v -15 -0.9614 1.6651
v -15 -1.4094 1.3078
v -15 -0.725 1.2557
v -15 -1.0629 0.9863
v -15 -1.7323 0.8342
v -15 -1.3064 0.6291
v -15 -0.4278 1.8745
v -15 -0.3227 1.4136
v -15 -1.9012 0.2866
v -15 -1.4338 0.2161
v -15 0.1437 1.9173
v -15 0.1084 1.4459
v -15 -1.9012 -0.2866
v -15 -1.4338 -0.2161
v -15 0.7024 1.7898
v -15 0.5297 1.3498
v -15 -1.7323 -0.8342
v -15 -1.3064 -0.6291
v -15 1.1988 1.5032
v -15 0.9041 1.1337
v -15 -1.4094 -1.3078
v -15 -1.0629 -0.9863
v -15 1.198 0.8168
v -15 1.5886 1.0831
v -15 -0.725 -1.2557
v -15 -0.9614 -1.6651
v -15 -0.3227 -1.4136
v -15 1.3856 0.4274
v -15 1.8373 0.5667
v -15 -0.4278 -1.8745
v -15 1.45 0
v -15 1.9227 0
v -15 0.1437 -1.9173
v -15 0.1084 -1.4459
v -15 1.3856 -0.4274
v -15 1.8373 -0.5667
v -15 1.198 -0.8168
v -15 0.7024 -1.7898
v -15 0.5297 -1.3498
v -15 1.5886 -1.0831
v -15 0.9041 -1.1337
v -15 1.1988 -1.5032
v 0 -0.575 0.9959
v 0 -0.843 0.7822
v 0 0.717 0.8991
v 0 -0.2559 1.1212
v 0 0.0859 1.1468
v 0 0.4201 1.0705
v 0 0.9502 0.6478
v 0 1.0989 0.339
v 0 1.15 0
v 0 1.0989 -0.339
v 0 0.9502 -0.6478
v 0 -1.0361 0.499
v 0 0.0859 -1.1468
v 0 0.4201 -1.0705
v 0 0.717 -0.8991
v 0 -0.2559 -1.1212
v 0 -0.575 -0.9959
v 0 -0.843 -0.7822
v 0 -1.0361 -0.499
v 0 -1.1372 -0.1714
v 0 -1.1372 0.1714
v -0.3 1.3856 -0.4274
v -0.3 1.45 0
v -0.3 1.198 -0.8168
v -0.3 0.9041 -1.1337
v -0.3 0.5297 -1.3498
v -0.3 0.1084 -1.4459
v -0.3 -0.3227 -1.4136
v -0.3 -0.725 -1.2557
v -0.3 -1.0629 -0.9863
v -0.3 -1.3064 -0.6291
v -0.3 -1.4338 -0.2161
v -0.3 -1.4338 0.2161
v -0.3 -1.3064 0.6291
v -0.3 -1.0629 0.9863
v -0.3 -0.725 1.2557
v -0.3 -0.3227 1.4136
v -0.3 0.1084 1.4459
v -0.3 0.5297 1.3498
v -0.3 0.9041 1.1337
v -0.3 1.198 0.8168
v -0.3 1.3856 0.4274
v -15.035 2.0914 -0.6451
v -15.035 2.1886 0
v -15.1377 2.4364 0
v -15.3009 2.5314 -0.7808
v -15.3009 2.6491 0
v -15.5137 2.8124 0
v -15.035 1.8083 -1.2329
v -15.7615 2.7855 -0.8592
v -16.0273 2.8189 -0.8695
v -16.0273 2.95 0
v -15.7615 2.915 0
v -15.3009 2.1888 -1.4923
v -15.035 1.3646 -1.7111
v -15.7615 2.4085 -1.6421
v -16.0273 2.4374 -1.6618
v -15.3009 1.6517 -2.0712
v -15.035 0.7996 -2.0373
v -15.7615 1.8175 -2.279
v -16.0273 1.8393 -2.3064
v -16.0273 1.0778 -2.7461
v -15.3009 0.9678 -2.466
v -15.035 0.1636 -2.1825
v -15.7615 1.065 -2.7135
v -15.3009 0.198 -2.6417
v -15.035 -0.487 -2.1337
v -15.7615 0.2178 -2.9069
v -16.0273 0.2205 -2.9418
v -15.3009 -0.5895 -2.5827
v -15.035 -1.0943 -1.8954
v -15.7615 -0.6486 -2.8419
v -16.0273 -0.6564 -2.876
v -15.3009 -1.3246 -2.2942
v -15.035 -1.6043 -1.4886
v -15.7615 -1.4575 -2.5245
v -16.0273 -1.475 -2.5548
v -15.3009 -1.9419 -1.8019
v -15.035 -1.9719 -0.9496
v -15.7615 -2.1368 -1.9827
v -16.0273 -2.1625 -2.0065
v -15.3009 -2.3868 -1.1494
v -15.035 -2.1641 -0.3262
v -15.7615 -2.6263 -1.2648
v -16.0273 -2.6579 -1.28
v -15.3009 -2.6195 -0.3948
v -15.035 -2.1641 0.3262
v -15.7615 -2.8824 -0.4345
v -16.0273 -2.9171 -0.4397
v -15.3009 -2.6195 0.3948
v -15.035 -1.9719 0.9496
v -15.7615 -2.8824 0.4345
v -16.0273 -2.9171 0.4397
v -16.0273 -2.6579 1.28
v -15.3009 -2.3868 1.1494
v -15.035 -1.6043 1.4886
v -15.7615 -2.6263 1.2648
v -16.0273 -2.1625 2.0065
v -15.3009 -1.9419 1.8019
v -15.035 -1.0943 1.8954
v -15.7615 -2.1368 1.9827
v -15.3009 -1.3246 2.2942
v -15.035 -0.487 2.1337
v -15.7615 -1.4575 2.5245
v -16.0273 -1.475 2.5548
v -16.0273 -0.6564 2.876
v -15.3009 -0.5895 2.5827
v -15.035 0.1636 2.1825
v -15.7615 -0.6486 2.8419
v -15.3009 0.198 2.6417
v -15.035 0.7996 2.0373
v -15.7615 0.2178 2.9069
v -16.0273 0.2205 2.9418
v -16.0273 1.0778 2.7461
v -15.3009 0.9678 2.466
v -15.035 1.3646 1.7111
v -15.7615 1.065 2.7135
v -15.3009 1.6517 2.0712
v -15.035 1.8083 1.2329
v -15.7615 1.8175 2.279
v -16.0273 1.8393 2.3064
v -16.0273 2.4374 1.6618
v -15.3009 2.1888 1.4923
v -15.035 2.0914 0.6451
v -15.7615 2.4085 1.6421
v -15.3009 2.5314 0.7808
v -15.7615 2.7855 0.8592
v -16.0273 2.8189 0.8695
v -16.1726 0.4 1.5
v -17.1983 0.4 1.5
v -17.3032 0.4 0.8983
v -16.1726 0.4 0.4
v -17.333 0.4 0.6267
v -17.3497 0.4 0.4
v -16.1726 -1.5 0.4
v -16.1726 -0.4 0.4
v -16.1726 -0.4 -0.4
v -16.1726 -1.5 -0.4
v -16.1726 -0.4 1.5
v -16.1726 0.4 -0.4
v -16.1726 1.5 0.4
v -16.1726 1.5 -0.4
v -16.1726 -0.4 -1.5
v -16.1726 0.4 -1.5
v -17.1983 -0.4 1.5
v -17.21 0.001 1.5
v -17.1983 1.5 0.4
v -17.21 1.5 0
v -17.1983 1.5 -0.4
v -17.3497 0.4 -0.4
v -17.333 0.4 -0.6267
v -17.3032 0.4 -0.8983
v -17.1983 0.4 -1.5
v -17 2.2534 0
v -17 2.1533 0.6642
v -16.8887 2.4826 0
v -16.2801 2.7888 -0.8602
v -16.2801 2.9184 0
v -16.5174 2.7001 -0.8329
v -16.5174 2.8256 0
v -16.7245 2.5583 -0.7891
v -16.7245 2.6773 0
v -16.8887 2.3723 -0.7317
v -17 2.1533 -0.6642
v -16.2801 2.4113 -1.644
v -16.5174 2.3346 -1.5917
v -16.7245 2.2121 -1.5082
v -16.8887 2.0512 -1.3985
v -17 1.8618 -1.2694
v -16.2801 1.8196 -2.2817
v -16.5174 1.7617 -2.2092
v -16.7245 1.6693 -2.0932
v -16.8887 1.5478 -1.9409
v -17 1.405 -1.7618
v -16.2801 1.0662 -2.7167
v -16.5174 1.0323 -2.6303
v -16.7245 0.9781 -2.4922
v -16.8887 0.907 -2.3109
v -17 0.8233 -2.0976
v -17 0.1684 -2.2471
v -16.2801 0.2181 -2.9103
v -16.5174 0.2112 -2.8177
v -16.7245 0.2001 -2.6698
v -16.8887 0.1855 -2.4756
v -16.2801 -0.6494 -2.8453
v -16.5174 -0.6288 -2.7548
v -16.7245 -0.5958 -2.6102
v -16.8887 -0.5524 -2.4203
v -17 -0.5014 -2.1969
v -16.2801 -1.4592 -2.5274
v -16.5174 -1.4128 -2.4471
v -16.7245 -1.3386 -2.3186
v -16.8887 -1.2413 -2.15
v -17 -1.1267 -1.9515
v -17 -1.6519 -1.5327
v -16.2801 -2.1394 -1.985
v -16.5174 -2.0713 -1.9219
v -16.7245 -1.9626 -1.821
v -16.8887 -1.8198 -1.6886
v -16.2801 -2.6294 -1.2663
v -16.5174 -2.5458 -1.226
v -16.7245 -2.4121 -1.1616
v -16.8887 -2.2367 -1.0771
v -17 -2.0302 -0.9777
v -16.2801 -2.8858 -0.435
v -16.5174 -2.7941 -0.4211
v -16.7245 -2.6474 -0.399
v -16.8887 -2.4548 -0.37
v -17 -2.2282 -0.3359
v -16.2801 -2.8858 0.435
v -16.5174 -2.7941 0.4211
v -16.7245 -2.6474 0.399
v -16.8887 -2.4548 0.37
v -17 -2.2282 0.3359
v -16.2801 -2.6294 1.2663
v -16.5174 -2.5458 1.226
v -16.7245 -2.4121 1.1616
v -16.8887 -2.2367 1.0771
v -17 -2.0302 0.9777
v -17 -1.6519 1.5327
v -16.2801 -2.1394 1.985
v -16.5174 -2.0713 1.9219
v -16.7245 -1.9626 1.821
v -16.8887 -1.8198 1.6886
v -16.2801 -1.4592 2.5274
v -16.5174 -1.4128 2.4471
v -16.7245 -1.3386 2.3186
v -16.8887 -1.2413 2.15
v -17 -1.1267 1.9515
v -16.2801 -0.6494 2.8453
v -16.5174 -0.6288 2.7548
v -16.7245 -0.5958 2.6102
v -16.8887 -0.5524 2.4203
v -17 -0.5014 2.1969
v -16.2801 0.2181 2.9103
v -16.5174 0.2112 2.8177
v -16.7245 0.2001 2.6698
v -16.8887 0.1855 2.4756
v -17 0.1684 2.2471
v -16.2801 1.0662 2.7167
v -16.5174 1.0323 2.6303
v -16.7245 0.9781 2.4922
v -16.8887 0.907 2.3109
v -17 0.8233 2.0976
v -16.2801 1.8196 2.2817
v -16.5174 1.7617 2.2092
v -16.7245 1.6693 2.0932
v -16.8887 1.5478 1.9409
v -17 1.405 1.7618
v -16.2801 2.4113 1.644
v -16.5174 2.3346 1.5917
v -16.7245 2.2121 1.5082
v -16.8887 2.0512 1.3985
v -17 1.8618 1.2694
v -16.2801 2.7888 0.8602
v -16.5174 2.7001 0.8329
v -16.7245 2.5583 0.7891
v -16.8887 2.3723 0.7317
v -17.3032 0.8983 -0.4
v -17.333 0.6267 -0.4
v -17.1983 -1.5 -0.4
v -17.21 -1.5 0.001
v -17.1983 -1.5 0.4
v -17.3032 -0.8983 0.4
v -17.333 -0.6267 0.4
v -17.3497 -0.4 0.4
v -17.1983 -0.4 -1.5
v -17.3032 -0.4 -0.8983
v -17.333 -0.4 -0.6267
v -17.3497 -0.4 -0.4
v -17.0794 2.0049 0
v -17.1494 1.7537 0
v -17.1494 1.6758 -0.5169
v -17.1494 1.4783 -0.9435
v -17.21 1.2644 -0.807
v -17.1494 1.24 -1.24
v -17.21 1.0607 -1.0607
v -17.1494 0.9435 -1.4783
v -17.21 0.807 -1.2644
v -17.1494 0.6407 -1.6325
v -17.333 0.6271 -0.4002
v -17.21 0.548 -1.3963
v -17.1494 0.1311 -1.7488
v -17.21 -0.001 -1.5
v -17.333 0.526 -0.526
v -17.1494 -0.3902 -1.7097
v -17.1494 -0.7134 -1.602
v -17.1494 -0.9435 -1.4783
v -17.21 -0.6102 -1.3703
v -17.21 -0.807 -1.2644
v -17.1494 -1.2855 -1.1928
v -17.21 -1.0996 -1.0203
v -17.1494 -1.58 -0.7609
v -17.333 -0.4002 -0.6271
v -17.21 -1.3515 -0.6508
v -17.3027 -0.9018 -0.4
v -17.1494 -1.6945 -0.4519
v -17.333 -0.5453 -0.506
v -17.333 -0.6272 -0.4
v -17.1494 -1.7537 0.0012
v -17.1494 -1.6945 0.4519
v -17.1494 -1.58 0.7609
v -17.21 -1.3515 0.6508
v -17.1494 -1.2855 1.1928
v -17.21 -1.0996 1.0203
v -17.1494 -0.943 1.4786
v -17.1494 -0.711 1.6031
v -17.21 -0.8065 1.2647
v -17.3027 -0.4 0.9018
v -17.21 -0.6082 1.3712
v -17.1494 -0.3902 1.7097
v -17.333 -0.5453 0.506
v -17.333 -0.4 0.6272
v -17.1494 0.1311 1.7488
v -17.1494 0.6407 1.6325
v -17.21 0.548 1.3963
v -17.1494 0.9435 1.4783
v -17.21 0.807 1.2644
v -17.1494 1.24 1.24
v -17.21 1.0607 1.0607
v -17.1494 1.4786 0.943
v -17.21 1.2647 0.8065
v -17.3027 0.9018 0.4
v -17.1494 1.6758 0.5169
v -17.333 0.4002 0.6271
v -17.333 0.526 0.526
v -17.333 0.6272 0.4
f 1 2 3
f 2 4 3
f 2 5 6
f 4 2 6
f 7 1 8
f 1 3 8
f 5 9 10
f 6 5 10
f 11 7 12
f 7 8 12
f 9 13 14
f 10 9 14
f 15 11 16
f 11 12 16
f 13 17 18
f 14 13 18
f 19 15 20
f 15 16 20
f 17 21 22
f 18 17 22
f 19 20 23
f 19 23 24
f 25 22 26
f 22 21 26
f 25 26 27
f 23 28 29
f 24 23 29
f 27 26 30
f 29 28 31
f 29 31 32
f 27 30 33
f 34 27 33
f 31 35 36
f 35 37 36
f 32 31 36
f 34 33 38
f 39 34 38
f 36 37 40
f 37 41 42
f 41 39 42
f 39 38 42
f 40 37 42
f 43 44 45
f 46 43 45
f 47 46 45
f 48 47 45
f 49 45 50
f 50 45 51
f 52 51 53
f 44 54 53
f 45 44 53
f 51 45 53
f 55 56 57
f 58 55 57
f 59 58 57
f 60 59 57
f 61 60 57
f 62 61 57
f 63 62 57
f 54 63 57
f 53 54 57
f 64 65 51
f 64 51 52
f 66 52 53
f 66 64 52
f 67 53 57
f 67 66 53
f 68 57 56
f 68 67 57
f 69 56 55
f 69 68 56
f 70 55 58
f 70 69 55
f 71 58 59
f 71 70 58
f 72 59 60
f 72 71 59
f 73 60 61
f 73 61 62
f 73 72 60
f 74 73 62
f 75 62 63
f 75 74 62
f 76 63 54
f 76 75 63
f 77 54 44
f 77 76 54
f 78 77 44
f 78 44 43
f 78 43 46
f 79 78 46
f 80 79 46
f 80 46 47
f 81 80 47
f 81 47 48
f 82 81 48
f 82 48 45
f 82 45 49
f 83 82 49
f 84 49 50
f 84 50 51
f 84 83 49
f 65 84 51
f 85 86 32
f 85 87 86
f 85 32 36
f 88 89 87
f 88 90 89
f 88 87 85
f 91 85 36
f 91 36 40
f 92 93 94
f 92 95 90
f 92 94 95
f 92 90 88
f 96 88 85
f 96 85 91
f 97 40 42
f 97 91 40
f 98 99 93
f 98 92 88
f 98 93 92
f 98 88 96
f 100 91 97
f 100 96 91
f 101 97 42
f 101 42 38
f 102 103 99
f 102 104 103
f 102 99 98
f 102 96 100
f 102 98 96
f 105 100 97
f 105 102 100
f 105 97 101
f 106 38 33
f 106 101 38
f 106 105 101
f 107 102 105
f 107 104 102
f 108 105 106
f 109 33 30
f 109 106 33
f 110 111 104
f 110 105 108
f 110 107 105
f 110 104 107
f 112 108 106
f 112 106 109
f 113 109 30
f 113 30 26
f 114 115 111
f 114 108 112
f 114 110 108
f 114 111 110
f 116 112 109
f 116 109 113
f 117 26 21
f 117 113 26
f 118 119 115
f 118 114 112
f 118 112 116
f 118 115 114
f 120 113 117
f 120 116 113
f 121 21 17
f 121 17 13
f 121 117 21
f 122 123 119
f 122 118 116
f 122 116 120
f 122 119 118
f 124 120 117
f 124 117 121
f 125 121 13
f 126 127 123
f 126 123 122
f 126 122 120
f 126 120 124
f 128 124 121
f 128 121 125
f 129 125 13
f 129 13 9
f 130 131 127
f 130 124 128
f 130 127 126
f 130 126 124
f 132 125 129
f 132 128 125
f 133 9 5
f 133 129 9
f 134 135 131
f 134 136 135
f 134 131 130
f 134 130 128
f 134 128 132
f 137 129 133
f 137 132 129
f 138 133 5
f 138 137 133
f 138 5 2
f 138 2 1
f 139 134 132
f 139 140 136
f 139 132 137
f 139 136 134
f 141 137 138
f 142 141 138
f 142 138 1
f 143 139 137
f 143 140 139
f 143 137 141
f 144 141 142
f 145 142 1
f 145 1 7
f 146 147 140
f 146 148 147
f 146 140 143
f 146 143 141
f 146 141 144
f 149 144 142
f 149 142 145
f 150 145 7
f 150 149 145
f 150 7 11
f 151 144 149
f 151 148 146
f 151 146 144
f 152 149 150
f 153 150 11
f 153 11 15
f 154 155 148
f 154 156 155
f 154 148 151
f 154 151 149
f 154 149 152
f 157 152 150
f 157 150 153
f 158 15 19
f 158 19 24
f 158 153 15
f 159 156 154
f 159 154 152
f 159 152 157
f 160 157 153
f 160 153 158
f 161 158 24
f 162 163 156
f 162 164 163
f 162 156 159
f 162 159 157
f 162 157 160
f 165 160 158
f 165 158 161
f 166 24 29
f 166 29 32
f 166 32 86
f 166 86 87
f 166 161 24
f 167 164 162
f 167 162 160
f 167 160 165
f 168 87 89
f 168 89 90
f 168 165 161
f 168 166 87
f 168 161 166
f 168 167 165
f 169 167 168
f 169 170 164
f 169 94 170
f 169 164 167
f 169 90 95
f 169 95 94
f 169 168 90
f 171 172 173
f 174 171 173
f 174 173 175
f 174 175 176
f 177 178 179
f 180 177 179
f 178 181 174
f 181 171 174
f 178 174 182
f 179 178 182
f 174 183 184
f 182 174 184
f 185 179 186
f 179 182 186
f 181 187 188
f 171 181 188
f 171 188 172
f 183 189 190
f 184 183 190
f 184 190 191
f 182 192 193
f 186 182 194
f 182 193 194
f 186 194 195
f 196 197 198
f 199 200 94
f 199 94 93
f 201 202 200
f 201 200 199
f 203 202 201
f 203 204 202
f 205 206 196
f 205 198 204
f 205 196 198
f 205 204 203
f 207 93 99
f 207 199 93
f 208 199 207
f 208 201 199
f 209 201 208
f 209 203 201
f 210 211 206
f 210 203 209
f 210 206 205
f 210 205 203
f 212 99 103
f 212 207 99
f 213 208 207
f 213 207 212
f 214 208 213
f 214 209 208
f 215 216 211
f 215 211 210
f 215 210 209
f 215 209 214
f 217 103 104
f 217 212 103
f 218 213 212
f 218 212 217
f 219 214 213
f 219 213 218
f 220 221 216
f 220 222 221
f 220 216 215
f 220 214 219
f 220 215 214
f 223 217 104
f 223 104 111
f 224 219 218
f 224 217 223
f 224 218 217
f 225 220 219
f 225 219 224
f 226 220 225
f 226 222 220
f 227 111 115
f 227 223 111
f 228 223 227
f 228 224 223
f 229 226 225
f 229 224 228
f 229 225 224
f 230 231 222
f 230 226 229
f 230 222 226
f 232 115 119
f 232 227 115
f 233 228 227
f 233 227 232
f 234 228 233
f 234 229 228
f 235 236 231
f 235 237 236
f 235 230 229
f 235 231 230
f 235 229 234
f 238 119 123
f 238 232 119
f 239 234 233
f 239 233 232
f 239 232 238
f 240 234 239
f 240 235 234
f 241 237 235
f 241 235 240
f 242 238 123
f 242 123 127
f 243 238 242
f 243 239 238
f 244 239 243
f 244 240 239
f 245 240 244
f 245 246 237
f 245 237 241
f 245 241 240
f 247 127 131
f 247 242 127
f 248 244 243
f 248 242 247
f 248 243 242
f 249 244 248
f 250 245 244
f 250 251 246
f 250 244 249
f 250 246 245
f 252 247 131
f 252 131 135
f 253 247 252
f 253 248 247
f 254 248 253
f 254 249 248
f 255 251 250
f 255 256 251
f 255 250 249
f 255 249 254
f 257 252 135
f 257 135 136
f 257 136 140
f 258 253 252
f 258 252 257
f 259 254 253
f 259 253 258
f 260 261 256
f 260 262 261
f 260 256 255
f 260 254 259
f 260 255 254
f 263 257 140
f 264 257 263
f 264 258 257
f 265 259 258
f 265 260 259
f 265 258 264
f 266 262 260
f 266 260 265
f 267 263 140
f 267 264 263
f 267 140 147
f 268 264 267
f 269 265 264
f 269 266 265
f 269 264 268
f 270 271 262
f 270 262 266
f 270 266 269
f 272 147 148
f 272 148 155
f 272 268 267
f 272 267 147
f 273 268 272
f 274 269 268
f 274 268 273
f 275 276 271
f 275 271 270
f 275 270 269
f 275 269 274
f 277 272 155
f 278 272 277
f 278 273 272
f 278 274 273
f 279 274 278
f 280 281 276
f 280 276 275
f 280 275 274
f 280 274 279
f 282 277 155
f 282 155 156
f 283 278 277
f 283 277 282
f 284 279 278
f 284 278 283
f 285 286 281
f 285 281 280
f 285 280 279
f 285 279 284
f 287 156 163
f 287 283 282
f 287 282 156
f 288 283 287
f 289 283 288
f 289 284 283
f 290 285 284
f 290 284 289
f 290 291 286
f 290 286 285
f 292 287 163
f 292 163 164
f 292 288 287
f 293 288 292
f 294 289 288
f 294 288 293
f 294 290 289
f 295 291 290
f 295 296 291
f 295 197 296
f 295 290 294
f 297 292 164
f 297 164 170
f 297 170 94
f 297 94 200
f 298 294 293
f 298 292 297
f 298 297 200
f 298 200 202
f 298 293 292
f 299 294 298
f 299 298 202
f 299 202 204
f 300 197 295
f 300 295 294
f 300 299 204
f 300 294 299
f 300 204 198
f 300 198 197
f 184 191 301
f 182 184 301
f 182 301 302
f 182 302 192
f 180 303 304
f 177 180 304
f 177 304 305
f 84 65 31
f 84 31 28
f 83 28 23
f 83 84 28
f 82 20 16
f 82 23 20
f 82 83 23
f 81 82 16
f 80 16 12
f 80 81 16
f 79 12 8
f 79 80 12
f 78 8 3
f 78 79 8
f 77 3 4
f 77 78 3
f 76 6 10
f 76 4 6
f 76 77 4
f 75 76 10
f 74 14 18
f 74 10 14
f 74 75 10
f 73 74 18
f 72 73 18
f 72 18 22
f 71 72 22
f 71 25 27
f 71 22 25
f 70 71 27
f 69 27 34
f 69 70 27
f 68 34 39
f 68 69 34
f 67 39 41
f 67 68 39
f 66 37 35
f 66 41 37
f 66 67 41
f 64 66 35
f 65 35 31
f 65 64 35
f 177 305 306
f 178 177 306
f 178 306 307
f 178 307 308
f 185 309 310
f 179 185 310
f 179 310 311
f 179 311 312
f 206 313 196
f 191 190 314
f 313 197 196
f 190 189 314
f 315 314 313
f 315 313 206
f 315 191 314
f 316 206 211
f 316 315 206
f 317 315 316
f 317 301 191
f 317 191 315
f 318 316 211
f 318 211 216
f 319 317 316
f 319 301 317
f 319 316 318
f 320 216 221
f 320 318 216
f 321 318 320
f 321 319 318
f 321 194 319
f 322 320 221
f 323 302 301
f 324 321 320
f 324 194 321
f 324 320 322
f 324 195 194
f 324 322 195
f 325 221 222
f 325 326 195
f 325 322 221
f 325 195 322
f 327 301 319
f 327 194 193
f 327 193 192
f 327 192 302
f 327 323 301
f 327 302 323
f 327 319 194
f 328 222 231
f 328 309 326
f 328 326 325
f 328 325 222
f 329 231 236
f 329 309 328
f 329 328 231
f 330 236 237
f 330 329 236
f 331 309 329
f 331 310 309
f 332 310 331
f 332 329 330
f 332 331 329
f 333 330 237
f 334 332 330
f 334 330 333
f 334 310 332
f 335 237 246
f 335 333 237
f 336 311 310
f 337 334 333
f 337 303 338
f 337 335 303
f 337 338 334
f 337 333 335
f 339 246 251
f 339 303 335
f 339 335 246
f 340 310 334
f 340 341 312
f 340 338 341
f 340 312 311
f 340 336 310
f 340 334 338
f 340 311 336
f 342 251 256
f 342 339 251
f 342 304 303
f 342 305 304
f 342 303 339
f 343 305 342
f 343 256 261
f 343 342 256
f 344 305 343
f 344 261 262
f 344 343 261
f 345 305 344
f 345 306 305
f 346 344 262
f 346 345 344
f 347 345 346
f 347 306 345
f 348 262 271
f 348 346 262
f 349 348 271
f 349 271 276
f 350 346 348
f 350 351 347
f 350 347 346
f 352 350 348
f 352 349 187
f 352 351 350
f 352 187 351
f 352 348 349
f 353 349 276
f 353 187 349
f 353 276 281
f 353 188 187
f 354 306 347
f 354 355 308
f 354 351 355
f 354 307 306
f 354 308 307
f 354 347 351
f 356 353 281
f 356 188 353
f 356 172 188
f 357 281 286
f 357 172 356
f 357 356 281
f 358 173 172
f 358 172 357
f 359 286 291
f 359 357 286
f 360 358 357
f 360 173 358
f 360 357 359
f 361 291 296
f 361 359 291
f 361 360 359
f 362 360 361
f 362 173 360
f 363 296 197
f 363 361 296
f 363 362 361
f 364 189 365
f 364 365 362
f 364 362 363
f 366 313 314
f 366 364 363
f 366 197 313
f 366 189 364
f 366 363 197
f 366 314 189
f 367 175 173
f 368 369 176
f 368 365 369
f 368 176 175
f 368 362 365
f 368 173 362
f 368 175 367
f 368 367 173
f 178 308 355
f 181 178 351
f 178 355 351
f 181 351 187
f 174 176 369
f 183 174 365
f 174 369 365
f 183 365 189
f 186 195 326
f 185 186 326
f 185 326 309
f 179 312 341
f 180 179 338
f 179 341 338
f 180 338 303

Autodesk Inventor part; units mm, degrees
ref_plane "YZ Plane" through (0, 0, 0) normal (1, 0, 0) x (0, 1, 0)
ref_plane "XZ Plane" through (0, 0, 0) normal (0, 1, 0) x (-1, 0, 0)
sketch "Эскиз1" plane through (0, 0, 0) normal (0, 0, 1) x (1, 0, 0)
  line L0 (0, 0) -> (-17.3726, 0)
  arc A0 (-15, 1.9227) -> (-17, 2.2534) centre (-16.0273, 1.9227) ccw
  line L1 (-15, 1.9227) -> (-15, 1.45)
  line L2 (-15, 1.45) -> (0, 1.45)
  line L3 (0, 1.45) -> (0, 0)
  line L4 (-17.6724, 2.95) -> (-15.1128, 2.95)
  arc A1 (-17, 2.2534) -> (-17.3726, 0) centre (-10.3726, 0) ccw
  dimension "d0" = 2.9
  dimension "d1" = 5.9
  dimension "d2" = 2
  dimension "d3" = 15
  dimension "d4" = 7
revolve "Вращение1" add sketch "Эскиз1" angle 360 about axis through (0, 0, 0) along (-1, 0, 0)
chamfer "Фаска1" distance 0.3 angle 45 1 edges at (0, -1.45, 0)
ref_plane "РабПлоскость2" through (-17.3726, 0, 0) normal (1, 0, 0) x (0, 0, -1)
sketch "Эскиз2" plane through (-17.3726, 0, 0) normal (1, 0, 0) x (0, 0, -1)
  line L0 (-0.4, 1.5) -> (0.4, 1.5)
  line L1 (0.4, 1.5) -> (0.4, -1.5)
  line L2 (0.4, -1.5) -> (-0.4, -1.5)
  line L3 (-0.4, -1.5) -> (-0.4, 1.5)
  line L4 (-1.5, 0.4) -> (1.5, 0.4)
  line L5 (1.5, 0.4) -> (1.5, -0.4)
  line L6 (1.5, -0.4) -> (-1.5, -0.4)
  line L7 (-1.5, -0.4) -> (-1.5, 0.4)
  point P0 (0, 0)
  point P1 (0, 1.5)
  point P2 (0, 0.4)
  point P3 (-1.5, 0)
  point P4 (-0.4, 0)
  point P5 (0.4, 0.4)
  point P6 (-0.4, 0.4)
  point P7 (-0.4, -0.4)
  point P8 (0.4, -0.4)
  dimension "d10" = 0.8
  dimension "d11" = 3
extrude "Выдавливание1" cut sketch "Эскиз2" along normal blind 1.2
properties part number "Винт М3х19"
